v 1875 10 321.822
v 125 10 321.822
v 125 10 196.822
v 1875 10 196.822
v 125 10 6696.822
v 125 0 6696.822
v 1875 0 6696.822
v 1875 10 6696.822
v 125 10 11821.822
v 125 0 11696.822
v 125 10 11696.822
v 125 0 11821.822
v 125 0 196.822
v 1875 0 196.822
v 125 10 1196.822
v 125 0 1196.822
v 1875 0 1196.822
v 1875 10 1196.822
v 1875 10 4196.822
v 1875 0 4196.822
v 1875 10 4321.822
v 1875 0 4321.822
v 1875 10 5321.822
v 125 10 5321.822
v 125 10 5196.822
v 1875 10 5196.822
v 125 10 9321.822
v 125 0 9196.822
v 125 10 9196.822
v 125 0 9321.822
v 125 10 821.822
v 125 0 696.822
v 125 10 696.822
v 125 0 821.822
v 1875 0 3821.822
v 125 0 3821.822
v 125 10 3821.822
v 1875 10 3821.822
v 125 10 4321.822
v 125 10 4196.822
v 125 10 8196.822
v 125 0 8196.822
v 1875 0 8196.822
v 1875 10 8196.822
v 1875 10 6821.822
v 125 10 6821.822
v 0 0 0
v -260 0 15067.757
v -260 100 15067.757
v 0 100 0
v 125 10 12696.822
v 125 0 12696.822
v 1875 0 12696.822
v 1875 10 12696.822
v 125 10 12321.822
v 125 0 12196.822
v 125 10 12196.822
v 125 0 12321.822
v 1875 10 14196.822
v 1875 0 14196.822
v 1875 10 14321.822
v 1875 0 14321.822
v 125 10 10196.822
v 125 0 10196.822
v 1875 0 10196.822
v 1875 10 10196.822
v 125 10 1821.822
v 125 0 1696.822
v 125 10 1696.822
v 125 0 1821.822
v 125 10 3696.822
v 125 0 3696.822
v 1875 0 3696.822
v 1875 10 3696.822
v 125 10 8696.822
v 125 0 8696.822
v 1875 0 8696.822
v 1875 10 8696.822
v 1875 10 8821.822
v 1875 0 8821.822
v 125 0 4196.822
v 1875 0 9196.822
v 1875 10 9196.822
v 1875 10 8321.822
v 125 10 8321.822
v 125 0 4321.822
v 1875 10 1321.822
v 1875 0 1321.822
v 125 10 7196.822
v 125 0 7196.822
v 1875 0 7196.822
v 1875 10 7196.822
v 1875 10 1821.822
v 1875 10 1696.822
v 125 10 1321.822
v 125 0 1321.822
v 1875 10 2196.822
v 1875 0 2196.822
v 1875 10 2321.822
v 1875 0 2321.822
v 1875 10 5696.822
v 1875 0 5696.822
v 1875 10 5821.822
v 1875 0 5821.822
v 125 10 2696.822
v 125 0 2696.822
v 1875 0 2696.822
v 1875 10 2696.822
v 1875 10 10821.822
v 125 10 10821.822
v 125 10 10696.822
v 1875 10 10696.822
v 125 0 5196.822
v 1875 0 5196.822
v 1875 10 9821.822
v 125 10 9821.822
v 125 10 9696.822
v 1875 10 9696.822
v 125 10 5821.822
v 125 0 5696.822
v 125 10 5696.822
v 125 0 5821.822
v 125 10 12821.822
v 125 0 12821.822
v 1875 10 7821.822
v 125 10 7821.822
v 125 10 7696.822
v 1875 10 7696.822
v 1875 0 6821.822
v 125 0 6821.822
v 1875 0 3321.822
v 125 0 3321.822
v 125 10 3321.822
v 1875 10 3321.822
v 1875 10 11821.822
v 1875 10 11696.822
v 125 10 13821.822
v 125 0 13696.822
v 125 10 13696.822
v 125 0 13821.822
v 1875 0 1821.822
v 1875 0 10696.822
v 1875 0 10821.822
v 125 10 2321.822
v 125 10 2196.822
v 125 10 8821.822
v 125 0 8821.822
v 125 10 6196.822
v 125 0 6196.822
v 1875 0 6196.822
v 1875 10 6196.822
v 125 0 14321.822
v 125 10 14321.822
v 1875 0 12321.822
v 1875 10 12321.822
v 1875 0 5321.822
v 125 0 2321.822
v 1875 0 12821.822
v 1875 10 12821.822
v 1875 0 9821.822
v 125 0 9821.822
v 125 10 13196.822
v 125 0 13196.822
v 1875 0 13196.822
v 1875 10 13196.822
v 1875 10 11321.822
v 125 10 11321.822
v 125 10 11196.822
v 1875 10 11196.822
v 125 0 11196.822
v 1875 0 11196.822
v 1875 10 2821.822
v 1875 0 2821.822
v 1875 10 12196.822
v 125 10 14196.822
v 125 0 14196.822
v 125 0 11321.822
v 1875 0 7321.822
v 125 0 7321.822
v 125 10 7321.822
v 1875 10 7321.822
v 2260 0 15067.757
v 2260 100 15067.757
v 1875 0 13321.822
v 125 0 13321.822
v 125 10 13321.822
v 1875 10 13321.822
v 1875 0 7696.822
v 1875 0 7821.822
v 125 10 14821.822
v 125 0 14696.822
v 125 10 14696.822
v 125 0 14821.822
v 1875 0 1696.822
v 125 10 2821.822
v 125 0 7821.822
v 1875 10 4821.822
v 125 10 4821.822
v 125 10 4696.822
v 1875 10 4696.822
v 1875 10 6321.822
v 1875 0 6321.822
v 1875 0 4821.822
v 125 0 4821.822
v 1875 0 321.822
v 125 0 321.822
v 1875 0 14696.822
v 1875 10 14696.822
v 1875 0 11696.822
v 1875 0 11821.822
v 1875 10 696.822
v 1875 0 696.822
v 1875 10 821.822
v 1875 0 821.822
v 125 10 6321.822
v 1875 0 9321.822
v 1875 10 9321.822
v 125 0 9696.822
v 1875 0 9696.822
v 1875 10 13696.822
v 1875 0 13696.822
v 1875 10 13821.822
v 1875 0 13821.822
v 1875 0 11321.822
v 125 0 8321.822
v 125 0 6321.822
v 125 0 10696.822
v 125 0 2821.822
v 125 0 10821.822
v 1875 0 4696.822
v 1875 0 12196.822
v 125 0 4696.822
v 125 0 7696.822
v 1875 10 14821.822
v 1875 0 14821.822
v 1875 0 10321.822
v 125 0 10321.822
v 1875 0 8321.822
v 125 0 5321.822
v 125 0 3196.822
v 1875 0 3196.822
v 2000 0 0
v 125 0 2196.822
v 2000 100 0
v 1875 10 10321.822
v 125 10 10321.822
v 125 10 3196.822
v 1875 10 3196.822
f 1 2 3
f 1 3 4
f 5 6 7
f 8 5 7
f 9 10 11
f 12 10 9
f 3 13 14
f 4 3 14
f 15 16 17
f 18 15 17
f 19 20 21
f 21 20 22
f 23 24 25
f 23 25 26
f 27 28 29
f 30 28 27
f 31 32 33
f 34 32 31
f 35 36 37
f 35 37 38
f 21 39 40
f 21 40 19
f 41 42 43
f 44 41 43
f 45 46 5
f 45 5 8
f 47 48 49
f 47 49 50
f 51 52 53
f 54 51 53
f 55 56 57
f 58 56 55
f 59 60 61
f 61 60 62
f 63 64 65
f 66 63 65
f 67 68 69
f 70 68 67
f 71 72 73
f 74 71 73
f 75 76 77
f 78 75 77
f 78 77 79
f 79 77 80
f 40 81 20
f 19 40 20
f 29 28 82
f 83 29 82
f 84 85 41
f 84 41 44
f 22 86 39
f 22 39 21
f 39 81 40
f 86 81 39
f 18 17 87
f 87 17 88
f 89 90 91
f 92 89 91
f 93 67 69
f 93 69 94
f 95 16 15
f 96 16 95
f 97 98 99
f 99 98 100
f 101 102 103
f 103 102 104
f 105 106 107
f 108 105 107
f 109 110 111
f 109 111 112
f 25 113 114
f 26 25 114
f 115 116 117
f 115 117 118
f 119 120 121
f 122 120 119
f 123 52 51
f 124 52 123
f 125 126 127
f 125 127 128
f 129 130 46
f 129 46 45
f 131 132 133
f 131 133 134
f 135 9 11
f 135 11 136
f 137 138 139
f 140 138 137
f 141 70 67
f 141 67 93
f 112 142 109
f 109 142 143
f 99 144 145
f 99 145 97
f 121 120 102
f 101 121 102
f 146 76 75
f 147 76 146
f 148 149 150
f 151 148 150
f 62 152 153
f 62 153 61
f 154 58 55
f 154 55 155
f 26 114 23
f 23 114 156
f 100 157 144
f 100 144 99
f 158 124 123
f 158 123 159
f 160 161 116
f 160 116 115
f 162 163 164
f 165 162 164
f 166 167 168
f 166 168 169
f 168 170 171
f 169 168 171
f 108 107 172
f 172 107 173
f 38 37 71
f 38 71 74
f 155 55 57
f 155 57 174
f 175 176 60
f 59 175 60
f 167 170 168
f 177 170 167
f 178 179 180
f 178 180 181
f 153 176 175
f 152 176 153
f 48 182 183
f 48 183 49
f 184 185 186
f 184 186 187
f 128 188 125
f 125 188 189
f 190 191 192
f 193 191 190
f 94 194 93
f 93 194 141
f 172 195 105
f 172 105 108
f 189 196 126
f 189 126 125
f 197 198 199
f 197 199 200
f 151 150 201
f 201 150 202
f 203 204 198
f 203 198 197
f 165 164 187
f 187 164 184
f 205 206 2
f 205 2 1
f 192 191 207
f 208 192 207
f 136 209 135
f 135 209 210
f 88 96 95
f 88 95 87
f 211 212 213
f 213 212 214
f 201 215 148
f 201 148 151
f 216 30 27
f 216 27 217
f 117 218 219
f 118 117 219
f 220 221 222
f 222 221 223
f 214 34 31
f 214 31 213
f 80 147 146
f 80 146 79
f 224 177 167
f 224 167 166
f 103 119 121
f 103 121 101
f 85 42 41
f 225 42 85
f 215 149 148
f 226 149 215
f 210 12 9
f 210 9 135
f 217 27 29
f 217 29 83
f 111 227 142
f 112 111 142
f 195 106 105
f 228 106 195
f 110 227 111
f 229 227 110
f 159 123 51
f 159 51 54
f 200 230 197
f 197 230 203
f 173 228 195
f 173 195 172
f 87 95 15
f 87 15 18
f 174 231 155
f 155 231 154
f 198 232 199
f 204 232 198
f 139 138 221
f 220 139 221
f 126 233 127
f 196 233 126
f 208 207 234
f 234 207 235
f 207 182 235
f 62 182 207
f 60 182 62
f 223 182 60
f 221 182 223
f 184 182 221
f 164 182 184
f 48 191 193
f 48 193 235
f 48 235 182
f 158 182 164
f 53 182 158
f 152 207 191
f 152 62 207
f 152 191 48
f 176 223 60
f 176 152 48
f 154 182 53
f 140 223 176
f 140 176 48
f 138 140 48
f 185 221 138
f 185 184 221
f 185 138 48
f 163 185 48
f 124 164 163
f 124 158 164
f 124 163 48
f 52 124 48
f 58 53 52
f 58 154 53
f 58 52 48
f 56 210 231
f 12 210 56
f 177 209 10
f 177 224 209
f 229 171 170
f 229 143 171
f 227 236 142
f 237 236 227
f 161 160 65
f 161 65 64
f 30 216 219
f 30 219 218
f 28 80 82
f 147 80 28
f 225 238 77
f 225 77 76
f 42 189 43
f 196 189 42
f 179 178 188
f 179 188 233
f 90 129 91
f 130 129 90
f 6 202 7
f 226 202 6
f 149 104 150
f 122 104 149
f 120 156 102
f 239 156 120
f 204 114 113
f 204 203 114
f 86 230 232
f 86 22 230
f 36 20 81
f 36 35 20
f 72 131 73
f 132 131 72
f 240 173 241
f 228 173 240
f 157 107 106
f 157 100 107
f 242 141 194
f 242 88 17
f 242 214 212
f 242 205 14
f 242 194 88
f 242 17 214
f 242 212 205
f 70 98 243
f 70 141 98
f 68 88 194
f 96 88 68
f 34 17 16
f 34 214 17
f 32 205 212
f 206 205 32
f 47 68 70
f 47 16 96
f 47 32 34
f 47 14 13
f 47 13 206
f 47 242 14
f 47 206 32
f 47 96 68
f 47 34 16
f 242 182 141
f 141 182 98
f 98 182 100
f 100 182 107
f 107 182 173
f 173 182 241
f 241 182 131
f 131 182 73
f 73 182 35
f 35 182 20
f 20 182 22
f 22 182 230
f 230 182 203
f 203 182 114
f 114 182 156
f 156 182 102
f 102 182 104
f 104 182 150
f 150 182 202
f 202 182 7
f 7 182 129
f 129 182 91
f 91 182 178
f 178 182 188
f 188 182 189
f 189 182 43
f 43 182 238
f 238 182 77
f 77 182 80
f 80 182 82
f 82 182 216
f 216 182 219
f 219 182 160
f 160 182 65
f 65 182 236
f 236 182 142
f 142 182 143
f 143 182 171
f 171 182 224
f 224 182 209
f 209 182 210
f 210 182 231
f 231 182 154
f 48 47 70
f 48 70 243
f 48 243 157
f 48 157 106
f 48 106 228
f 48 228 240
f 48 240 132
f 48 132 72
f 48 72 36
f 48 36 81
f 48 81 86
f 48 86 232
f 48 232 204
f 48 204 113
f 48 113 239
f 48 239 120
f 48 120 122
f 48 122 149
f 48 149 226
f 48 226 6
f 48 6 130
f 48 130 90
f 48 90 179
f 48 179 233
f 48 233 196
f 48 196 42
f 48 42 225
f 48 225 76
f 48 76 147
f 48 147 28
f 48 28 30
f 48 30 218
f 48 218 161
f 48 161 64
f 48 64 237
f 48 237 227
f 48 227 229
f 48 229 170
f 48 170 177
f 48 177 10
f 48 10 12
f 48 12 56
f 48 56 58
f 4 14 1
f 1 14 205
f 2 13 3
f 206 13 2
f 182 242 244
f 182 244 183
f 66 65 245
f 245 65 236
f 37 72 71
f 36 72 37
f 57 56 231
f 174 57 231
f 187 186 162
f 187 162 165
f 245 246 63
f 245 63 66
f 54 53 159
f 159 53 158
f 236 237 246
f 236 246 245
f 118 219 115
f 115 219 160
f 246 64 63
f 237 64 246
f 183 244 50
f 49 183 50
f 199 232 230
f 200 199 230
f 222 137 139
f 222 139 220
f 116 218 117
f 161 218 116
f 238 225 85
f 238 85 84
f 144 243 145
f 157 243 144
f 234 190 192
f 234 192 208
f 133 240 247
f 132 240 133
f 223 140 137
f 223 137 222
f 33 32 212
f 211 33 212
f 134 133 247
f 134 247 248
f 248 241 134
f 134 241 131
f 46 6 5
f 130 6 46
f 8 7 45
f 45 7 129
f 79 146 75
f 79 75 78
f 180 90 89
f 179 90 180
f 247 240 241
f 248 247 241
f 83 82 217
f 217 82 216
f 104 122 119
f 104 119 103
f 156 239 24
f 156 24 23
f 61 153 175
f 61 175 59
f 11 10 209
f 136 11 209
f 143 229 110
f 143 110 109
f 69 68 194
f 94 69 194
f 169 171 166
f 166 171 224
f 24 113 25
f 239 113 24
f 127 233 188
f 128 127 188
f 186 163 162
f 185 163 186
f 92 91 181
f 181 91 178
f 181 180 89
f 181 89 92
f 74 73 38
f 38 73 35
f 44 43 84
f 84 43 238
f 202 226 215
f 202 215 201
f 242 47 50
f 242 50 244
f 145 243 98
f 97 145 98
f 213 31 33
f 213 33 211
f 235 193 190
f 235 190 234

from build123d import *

# Parameters (mm, degrees)
BOSS_EXTRUDE1_DEPTH = 100
SKETCH2_W           = 1750
SKETCH2_H           = 125
CUT_EXTRUDE1_DEPTH  = 10
LPATTERN1_COUNT     = 30
LPATTERN1_PITCH     = 500


with BuildPart() as part:
    # Sketch1 → Boss-Extrude1 (new body)
    with BuildSketch(Plane(origin=(0, 0, 0), x_dir=(1, 0, 0), z_dir=(0, 1, 0))):
        Polygon((0, 0), (2000, 0), (2260, -15067.75696645), (-260, -15067.75696645), align=None)
    extrude(amount=BOSS_EXTRUDE1_DEPTH)

    # Sketch2 → Cut-Extrude1 (cut)
    with BuildSketch(Plane.XZ):
        with Locations((1000, 14759.321892241)):
            Rectangle(SKETCH2_W, SKETCH2_H)
    cut_extrude1 = extrude(amount=-CUT_EXTRUDE1_DEPTH, mode=Mode.SUBTRACT)

    # LPattern1: Cut-Extrude1 ×30
    with Locations(*[(0, 0, -i * LPATTERN1_PITCH) for i in range(1, LPATTERN1_COUNT)]):
        add(cut_extrude1, mode=Mode.SUBTRACT)


solid = part.part
